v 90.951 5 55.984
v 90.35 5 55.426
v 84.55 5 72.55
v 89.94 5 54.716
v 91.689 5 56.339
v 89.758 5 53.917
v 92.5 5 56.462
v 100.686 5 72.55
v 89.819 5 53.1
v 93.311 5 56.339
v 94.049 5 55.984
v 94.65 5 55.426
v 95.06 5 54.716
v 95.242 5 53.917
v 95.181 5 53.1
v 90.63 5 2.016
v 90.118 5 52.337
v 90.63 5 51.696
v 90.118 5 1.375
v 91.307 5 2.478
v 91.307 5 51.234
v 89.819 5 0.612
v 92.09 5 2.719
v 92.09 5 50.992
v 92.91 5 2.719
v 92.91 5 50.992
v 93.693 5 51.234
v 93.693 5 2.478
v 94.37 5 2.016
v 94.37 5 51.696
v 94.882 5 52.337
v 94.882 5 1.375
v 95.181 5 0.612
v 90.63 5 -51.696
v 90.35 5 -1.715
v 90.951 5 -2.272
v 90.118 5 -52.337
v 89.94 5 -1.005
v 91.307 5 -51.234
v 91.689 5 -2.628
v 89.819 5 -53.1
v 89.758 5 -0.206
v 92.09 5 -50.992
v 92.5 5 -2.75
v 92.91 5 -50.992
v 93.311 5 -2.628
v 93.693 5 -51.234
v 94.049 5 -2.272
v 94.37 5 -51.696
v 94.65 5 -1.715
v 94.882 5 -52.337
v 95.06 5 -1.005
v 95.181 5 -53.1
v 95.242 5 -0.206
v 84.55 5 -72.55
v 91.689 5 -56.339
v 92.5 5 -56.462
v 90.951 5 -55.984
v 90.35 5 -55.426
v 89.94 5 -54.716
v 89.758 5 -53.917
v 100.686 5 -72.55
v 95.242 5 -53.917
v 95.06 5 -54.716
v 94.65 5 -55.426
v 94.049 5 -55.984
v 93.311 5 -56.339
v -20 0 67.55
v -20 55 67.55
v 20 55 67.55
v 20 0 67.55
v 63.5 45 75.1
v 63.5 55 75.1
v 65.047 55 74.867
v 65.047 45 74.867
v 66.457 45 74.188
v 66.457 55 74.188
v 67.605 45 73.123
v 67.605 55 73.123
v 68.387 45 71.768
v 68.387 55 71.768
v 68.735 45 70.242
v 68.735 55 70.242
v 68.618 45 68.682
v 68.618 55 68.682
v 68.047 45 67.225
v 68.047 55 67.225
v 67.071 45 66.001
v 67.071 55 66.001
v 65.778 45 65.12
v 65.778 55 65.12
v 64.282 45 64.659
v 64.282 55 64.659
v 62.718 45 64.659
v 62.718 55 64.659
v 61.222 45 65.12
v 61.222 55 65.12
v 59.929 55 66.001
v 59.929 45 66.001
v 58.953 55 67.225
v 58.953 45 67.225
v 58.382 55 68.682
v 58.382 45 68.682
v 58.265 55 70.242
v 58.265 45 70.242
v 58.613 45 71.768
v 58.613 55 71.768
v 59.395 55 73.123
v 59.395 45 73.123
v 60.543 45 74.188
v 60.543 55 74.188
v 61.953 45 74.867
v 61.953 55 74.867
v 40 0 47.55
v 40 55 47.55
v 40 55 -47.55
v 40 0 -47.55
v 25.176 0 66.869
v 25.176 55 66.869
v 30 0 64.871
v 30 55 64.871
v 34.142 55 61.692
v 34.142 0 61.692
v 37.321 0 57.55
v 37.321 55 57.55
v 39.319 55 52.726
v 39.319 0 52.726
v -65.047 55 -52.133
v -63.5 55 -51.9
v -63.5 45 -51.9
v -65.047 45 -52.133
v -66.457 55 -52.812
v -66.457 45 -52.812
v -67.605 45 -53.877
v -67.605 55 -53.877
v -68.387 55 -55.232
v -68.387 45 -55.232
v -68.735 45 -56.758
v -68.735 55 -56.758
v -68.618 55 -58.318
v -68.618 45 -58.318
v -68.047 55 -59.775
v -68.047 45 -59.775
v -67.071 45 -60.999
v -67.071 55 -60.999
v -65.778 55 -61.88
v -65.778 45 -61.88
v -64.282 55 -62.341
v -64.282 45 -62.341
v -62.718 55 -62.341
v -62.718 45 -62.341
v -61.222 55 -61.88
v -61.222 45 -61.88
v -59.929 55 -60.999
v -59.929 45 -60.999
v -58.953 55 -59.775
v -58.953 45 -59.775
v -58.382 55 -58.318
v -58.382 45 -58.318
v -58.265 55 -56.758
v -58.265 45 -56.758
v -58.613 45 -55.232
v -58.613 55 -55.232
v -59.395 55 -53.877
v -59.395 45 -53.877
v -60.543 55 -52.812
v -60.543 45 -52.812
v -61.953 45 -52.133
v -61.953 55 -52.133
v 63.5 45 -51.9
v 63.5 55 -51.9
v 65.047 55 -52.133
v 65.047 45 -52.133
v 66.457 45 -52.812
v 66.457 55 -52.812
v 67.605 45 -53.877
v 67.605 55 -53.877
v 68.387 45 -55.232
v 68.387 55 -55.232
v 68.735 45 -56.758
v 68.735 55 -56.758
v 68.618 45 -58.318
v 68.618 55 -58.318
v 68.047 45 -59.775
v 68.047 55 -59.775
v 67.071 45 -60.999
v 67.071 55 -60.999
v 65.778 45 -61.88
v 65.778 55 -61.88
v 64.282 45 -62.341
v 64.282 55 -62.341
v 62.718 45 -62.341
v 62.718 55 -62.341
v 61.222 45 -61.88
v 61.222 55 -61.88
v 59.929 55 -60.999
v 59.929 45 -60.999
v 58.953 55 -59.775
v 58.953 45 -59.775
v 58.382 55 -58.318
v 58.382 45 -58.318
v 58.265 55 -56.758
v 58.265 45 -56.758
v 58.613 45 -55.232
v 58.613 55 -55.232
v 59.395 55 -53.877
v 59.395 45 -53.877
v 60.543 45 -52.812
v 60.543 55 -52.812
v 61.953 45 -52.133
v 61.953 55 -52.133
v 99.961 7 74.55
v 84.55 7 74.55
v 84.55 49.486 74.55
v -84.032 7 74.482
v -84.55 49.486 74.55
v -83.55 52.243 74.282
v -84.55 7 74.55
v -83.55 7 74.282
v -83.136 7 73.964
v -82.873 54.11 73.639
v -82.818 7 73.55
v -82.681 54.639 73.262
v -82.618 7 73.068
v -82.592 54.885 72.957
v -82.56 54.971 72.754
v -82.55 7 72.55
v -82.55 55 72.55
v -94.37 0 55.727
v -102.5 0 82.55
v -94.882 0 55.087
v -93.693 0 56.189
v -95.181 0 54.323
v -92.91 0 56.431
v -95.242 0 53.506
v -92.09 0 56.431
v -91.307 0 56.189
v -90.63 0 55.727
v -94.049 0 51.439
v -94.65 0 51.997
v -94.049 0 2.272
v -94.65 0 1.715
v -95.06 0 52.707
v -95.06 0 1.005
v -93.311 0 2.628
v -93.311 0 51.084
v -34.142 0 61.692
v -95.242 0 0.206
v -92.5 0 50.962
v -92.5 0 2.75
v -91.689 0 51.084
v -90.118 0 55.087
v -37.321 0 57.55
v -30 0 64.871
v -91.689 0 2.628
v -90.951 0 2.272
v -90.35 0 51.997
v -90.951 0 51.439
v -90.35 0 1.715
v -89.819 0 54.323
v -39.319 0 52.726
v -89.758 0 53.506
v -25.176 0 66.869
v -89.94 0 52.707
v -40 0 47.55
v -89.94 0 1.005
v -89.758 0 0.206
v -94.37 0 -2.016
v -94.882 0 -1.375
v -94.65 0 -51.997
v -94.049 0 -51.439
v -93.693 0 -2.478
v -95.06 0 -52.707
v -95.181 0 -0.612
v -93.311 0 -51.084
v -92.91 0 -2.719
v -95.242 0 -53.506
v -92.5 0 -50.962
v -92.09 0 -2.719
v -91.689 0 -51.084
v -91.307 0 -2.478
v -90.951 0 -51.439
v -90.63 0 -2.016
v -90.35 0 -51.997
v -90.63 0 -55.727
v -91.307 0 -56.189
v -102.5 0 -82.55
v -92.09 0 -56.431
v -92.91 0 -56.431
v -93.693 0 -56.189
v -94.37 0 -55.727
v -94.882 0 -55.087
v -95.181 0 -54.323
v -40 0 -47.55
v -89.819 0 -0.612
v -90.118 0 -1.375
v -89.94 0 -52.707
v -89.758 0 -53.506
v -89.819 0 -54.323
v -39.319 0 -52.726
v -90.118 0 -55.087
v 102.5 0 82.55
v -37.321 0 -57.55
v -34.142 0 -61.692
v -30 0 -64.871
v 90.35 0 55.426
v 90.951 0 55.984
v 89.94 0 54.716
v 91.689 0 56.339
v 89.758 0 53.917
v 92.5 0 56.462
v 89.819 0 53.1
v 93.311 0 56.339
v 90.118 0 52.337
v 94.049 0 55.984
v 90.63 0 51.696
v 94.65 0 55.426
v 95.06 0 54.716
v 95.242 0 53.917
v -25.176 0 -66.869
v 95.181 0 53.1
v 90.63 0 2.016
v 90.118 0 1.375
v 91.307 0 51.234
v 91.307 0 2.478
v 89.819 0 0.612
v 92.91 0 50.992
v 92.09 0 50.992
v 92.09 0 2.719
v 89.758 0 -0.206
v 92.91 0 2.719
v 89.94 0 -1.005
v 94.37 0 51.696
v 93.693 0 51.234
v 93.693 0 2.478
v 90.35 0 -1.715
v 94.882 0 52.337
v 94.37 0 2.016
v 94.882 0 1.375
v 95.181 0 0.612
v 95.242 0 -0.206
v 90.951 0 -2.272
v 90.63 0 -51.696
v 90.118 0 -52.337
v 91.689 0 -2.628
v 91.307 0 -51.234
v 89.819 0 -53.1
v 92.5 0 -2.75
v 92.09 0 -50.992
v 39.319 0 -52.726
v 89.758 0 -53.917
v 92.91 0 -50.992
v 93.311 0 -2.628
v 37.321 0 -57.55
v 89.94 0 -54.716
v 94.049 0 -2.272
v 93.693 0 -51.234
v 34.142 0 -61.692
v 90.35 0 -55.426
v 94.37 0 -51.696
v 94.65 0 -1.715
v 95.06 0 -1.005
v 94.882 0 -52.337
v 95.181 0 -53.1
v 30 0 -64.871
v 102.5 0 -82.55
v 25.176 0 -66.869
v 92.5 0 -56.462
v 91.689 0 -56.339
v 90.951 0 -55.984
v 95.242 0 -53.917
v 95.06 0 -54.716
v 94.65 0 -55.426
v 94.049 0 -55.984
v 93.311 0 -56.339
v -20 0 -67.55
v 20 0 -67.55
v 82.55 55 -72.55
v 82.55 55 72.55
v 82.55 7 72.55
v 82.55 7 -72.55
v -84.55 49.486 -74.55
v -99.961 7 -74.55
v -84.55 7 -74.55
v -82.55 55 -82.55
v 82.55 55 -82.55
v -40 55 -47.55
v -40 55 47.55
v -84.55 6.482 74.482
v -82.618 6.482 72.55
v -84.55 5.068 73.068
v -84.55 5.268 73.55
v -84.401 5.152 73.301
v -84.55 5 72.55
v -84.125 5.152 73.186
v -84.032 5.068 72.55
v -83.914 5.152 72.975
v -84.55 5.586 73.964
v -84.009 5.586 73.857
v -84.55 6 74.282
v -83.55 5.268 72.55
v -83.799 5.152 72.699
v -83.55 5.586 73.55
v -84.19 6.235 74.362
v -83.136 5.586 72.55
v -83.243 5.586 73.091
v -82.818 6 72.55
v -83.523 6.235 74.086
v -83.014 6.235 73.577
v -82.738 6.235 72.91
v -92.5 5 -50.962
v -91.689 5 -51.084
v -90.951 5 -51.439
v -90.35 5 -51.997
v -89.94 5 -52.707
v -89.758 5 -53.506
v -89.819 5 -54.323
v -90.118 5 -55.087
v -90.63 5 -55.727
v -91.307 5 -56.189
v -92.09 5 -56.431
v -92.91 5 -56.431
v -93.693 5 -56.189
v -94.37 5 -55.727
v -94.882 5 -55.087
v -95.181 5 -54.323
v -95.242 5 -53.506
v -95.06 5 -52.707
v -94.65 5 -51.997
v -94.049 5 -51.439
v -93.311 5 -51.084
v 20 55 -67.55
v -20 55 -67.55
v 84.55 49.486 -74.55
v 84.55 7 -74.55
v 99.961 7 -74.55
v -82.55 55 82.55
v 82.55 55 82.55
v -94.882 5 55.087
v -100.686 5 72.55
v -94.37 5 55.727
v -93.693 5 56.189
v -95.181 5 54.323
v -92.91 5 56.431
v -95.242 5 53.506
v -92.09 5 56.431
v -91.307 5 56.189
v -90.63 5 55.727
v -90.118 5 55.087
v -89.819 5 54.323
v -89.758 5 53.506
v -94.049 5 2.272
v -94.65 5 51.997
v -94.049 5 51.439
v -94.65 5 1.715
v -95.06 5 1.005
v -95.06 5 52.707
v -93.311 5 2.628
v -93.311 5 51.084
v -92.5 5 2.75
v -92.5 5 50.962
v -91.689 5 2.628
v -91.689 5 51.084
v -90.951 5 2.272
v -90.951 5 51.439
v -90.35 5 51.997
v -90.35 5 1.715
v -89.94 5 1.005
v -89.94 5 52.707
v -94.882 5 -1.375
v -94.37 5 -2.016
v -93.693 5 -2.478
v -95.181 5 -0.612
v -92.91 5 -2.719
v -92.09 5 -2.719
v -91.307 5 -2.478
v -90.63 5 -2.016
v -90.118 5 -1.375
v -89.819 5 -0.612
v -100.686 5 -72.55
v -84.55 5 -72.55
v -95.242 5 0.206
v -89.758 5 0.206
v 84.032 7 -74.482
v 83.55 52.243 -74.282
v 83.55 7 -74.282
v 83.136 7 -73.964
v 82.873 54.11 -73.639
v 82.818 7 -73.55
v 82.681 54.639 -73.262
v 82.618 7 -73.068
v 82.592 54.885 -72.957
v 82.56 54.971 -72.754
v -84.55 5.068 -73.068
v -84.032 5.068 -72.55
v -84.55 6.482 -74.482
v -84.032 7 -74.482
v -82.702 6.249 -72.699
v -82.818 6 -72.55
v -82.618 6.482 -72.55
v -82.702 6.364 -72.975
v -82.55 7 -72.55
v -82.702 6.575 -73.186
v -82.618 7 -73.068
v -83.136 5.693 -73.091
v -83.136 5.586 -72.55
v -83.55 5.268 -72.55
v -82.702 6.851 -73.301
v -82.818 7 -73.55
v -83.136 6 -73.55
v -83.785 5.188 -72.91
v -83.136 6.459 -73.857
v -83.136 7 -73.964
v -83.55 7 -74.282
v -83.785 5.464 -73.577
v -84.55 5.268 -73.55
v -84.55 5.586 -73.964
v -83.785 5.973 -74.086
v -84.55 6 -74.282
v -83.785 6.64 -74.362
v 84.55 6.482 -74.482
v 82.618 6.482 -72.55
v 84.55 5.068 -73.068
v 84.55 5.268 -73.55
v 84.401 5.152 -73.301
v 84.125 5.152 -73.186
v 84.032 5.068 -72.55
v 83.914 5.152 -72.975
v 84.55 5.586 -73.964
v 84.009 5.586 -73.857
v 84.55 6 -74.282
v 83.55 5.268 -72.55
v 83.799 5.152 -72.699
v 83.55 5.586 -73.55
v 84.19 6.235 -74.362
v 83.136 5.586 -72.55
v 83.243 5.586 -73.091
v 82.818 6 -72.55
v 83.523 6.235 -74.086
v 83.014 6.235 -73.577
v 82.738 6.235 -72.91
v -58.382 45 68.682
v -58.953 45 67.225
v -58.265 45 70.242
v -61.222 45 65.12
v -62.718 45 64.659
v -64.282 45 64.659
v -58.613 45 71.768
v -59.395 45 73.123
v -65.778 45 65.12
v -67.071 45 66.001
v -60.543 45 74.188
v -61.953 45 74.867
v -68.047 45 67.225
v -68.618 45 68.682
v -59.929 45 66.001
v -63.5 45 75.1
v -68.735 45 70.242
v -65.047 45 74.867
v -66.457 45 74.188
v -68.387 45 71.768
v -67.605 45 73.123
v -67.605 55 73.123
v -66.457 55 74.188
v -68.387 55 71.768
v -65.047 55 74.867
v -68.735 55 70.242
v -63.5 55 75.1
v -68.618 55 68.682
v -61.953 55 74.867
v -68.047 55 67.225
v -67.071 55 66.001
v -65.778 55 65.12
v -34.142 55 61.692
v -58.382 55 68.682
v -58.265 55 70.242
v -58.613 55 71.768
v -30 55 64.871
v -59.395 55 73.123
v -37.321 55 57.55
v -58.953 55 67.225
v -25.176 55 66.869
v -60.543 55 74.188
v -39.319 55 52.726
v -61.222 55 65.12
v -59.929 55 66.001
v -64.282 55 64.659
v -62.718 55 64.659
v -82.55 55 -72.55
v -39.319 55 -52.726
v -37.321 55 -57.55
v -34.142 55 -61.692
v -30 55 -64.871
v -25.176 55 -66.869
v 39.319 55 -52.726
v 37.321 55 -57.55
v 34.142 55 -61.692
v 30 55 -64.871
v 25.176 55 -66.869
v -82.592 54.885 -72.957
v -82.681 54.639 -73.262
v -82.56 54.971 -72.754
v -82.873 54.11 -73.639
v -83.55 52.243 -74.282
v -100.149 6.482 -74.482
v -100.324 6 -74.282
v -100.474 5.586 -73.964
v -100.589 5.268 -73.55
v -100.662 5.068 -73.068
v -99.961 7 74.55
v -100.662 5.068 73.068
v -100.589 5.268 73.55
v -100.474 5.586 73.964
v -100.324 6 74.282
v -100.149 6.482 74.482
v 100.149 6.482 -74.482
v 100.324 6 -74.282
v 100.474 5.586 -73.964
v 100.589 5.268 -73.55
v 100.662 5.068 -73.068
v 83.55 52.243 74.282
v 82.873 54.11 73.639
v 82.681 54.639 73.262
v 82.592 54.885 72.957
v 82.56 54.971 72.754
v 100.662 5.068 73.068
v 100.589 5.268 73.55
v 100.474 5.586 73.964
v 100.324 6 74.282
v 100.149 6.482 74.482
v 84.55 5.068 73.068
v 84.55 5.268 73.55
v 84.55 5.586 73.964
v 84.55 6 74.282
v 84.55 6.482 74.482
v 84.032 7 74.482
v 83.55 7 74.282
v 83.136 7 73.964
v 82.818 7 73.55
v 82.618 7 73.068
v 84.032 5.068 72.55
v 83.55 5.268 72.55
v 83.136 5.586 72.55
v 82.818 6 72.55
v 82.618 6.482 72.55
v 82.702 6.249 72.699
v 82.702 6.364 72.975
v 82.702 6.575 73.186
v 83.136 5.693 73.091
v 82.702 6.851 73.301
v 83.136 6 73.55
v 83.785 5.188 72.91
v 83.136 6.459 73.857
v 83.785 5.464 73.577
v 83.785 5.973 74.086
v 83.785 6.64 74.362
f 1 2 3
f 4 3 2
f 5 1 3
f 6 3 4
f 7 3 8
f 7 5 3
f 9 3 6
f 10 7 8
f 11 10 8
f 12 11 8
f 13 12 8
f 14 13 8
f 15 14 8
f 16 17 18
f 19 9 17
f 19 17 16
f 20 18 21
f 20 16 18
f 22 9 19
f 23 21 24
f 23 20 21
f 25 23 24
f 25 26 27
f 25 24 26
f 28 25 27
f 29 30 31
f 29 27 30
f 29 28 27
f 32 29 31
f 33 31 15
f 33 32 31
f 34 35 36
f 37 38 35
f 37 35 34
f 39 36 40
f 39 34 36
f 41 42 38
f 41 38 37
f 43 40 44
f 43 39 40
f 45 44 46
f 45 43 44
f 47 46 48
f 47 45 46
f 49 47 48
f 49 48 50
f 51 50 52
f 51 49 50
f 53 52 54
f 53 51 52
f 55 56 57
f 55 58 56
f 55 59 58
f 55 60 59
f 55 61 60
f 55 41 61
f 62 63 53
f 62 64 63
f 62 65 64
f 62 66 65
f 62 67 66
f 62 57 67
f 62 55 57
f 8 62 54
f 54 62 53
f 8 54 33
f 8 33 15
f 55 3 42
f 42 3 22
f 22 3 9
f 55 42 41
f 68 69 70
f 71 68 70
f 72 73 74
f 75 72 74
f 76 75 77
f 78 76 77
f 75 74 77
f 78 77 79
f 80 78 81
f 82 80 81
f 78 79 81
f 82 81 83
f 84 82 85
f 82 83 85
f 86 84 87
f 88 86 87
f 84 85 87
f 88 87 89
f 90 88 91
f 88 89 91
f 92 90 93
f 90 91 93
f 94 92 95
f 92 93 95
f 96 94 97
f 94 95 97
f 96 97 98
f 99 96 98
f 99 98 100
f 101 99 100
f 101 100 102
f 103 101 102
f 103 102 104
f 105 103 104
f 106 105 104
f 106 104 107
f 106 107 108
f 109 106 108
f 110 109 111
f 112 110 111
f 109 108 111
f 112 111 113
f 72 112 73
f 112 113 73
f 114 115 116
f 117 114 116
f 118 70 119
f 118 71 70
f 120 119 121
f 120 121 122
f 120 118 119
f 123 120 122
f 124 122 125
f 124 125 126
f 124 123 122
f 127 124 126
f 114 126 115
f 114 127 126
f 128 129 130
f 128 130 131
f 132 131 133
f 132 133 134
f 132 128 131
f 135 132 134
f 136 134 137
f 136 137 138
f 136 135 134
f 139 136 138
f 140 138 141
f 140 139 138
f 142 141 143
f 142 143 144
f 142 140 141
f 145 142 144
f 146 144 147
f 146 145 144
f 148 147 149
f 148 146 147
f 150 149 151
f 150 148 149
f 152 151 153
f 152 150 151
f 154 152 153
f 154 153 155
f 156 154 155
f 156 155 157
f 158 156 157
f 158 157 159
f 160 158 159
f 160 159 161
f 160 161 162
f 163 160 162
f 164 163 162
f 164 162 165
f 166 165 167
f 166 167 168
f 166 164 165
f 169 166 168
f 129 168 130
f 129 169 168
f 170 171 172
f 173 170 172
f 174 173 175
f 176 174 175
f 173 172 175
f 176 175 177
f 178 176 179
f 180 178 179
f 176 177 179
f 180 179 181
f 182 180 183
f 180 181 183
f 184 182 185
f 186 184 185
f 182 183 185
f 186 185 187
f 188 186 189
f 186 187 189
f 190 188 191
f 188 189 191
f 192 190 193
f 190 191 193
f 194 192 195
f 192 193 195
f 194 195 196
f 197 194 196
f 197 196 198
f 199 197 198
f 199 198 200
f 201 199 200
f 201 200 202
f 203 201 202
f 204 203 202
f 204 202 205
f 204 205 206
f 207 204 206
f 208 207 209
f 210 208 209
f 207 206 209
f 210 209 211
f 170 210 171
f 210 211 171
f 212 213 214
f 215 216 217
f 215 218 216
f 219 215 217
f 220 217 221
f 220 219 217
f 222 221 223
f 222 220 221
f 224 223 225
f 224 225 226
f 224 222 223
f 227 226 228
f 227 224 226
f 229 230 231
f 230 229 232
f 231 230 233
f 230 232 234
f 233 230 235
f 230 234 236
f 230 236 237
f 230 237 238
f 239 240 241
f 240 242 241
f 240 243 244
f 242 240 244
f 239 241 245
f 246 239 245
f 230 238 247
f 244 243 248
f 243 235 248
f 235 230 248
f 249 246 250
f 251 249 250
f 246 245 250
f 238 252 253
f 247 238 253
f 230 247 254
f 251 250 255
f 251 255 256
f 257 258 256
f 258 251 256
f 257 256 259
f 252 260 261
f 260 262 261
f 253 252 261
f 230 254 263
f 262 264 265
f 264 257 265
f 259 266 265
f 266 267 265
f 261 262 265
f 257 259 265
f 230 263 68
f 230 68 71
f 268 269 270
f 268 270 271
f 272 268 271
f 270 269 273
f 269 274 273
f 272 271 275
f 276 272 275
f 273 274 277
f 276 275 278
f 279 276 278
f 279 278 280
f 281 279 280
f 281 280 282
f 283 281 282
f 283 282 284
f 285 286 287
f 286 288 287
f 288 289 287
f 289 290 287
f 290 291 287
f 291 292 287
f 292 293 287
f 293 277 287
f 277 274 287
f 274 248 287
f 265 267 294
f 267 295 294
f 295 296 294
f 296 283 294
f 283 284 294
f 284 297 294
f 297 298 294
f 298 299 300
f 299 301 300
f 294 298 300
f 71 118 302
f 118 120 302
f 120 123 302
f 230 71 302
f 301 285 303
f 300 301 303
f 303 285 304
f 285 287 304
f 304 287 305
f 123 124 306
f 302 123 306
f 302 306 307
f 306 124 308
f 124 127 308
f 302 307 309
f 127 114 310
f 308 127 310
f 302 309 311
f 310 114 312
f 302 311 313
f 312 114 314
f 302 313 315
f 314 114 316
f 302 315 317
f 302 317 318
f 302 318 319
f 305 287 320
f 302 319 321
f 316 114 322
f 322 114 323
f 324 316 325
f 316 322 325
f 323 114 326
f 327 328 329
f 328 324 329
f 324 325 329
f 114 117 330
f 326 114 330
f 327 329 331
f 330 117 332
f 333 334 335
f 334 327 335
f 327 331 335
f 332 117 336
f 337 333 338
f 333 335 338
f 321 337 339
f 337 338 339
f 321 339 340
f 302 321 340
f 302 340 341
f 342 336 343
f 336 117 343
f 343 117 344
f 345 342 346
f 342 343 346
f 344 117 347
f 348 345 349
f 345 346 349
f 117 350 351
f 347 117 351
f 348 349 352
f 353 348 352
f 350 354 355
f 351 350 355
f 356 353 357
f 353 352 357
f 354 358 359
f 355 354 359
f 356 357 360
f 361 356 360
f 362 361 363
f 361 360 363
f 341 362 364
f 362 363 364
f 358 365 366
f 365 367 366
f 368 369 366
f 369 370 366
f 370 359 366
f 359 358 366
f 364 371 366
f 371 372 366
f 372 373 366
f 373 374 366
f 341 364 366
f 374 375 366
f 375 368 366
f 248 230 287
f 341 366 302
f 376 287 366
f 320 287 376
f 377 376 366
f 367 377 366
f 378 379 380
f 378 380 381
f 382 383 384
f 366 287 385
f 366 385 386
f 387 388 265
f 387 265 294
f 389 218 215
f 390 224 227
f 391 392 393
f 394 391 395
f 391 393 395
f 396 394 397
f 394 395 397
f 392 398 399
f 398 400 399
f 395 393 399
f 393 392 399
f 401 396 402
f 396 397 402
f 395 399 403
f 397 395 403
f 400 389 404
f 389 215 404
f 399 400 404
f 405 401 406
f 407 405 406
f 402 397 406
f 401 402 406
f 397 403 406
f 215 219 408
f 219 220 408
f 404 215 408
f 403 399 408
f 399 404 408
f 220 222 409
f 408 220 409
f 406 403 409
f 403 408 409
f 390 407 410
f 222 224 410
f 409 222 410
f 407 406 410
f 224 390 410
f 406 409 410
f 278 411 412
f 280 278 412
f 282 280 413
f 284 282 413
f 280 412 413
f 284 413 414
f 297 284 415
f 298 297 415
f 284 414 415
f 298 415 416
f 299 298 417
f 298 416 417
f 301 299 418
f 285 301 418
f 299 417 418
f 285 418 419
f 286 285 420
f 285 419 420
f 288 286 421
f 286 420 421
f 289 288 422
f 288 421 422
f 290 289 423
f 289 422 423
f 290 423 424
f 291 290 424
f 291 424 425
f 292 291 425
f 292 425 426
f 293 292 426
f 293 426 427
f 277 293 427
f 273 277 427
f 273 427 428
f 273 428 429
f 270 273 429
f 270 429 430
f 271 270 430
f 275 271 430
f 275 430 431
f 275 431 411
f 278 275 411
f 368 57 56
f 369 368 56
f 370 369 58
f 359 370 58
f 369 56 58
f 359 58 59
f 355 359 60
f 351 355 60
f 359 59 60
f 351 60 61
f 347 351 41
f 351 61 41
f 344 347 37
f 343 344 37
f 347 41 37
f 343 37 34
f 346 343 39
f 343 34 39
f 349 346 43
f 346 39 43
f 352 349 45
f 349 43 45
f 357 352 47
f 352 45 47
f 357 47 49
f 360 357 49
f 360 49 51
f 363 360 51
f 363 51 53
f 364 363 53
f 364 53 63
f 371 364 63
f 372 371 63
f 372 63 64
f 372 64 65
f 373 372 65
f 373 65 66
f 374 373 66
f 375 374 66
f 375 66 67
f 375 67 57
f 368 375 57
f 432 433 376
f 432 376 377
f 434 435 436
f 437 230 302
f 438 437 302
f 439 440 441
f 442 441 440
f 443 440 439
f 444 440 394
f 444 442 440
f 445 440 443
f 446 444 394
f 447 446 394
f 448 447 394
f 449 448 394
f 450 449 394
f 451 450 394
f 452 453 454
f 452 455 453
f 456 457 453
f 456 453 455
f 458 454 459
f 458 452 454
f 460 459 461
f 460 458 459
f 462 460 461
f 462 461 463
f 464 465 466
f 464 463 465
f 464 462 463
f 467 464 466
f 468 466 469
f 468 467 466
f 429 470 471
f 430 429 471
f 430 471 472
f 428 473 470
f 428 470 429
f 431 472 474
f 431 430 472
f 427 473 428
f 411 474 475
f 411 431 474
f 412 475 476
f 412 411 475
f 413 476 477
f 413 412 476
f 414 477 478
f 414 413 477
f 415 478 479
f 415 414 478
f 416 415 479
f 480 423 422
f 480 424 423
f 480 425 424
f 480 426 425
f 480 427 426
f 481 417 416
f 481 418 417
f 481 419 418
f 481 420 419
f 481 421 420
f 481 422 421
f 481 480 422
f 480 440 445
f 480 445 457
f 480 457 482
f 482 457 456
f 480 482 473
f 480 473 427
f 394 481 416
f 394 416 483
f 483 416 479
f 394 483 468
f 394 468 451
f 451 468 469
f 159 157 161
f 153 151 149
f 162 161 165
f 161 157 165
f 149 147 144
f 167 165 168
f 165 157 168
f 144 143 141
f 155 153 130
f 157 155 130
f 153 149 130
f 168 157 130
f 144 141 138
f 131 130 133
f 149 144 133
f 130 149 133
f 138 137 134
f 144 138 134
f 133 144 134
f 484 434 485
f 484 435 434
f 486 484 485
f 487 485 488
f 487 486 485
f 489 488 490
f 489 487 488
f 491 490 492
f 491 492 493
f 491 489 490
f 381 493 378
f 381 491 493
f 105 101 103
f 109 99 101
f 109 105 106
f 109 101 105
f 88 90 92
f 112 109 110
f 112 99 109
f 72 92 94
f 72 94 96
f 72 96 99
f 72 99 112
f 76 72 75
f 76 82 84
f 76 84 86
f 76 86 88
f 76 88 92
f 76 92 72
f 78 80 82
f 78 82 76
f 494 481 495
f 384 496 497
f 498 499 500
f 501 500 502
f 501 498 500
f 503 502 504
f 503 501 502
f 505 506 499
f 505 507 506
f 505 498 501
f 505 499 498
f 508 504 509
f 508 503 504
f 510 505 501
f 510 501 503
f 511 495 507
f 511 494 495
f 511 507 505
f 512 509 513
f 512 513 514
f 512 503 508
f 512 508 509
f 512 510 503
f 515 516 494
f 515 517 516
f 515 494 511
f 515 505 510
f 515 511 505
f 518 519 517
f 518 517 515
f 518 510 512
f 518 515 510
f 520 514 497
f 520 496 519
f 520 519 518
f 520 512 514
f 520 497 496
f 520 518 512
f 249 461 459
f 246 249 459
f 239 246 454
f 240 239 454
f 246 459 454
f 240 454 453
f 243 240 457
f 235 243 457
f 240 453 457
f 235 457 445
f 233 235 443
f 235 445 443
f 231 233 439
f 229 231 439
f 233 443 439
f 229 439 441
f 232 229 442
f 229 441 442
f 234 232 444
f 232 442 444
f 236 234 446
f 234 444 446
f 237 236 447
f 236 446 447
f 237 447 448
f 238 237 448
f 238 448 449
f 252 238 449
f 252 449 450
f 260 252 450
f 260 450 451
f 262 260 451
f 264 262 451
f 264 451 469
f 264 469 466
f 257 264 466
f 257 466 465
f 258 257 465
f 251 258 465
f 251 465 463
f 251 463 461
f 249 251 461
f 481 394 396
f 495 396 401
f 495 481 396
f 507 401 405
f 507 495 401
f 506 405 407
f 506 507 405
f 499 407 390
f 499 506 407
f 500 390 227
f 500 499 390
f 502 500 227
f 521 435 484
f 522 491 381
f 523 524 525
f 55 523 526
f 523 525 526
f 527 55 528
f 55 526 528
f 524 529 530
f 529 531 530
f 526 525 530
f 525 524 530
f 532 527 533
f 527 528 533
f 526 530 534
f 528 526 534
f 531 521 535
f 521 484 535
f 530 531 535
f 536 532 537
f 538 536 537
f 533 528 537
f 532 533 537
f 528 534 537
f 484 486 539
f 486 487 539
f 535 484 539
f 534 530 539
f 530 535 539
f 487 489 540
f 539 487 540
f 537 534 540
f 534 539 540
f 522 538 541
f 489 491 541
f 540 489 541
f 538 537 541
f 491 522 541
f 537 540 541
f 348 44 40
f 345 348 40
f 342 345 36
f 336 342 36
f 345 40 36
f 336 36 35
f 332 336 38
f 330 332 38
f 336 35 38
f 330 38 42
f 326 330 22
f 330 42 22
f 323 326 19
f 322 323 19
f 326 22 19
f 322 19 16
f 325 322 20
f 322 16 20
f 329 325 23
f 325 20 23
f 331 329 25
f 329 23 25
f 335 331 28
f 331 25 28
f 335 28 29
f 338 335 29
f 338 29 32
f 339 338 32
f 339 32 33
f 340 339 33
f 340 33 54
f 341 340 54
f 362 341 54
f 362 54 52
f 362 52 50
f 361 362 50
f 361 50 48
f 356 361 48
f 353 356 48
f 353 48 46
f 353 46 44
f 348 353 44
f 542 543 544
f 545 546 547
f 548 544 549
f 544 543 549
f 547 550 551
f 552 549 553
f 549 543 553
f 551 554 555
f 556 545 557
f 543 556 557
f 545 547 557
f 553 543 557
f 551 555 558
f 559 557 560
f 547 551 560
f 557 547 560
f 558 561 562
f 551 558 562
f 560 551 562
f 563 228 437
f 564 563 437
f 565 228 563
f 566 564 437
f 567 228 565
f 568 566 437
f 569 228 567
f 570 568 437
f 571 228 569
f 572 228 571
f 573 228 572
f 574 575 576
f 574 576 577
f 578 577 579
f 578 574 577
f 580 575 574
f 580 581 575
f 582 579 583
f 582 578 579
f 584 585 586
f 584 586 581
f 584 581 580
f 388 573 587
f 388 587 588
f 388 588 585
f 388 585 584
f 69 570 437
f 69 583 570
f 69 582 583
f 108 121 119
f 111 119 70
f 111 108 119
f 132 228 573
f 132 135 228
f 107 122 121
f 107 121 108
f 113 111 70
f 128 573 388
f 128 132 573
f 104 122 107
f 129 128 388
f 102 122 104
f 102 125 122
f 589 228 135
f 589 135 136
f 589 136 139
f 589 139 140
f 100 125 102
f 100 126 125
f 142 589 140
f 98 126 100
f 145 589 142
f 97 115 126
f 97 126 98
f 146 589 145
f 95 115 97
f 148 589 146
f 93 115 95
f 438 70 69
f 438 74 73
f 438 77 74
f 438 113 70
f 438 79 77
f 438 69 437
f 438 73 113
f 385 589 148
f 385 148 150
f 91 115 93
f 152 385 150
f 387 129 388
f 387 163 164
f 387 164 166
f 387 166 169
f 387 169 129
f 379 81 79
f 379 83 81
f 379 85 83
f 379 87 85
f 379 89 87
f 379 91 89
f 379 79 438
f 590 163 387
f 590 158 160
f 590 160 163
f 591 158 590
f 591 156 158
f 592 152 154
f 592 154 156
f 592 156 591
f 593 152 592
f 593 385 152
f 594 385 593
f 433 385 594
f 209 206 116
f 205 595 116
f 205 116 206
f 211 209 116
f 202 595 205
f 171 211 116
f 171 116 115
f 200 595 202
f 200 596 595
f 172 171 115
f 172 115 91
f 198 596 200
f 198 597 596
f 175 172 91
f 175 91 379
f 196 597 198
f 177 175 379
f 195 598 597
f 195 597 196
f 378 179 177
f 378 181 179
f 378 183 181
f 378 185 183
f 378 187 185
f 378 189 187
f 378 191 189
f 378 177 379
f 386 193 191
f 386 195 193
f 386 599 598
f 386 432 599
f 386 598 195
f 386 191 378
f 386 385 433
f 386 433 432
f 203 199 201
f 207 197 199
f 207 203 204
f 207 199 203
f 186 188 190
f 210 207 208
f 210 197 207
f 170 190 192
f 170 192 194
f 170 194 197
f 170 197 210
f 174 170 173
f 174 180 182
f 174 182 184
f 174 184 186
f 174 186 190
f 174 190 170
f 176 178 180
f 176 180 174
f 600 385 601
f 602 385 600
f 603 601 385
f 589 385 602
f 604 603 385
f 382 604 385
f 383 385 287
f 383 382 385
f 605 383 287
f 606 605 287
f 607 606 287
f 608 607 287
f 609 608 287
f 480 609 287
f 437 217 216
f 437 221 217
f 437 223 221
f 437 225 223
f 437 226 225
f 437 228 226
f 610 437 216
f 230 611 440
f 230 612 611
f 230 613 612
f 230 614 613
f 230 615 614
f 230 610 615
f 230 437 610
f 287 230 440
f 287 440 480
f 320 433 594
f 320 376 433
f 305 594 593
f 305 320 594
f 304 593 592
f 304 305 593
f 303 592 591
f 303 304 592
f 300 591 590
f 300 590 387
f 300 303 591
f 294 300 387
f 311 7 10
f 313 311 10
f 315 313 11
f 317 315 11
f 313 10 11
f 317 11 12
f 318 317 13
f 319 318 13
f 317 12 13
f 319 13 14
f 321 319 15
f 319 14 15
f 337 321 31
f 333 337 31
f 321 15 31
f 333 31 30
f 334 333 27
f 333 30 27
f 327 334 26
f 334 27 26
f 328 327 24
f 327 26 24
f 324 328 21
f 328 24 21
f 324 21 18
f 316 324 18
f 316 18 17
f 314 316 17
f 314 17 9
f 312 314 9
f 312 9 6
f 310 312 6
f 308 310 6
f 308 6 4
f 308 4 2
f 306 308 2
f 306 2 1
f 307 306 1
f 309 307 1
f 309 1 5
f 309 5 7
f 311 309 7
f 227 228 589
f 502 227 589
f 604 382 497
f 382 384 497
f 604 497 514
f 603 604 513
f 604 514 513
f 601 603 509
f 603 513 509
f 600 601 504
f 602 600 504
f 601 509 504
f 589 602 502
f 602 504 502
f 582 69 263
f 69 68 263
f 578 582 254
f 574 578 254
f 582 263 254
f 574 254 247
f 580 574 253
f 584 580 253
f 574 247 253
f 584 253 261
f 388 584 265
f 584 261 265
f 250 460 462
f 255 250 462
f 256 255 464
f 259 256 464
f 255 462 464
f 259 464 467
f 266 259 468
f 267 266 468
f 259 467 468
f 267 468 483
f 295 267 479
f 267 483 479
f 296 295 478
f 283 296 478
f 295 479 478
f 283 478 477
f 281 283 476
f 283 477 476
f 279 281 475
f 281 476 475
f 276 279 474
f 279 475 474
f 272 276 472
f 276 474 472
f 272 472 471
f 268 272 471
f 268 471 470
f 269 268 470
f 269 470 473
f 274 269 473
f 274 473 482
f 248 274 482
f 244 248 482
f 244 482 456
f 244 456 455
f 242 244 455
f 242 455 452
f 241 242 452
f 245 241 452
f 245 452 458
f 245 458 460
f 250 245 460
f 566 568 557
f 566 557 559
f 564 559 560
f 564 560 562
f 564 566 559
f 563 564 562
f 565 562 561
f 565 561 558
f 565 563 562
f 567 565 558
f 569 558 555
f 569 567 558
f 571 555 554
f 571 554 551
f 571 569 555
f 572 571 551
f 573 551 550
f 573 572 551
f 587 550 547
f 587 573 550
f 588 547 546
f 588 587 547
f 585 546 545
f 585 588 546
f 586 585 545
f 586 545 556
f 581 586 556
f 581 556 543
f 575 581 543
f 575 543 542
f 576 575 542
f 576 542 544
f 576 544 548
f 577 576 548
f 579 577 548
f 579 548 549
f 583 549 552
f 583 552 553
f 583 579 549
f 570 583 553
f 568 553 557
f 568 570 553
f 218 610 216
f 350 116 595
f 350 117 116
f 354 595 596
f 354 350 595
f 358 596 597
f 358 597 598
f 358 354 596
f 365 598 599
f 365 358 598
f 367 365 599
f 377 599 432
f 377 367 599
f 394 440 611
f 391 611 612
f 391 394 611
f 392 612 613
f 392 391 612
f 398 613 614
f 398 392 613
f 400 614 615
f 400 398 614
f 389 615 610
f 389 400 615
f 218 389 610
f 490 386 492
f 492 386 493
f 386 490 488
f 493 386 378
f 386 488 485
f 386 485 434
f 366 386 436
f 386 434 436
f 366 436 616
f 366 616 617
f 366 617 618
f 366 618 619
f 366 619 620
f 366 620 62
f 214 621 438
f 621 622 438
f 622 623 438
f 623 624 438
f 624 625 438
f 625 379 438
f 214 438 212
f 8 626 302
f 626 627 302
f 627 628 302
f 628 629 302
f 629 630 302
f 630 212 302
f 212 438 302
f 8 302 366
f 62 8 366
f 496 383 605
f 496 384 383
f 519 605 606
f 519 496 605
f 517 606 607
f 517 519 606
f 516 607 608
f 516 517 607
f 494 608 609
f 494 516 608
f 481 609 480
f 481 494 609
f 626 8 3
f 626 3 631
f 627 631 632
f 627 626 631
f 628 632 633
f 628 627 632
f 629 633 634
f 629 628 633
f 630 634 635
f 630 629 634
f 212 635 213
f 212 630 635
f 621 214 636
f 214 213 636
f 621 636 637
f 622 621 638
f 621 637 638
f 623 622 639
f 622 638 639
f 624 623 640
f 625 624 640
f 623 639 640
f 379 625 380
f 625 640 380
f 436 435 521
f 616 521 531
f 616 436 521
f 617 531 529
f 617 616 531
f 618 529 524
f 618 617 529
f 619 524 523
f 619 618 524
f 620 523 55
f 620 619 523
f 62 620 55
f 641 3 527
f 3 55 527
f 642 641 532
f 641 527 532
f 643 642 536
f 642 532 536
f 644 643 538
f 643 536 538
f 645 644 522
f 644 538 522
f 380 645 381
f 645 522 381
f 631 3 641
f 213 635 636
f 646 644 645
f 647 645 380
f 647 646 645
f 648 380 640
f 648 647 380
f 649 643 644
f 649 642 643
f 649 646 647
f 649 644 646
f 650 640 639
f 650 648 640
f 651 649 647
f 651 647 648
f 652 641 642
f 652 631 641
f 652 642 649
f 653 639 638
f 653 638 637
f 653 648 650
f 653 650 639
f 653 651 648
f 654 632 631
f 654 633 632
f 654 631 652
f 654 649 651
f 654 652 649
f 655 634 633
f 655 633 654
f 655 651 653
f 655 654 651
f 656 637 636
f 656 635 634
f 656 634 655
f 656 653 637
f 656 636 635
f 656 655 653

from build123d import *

# Parameters (mm, degrees)
SKETCH1_W           = 205
SKETCH1_H           = 165.1
BOSS_EXTRUDE1_DEPTH = 55
CUT_EXTRUDE1_REACH  = 203.964
SKETCH3_W           = 19.95
SKETCH3_H           = 149.1
CUT_EXTRUDE2_DEPTH  = 50
CUT_EXTRUDE3_REACH  = 142.786
SKETCH4_R           = 2.75
FILLET1_R           = 2
SKETCH5_R           = 5.25
CUT_EXTRUDE4_DEPTH  = 10
CUT_EXTRUDE5_REACH  = 144.639
SKETCH6_W           = 80
SKETCH6_H           = 135.1
FILLET2_R           = 20


with BuildPart() as part:
    # Sketch1 → Boss-Extrude1 (new body)
    with BuildSketch(Plane(origin=(0, 0, 0), x_dir=(1, 0, 0), z_dir=(0, 1, 0))):
        Rectangle(SKETCH1_W, SKETCH1_H)
    extrude(amount=BOSS_EXTRUDE1_DEPTH)

    # Sketch2 → Cut-Extrude1 (cut, up to next)
    with BuildSketch(Plane.XY.offset(82.55), mode=Mode.PRIVATE) as cut_extrude1_sk1:
        Polygon((82.55, 55), (102.5, 0), (102.5, 55), align=None)
    cut_extrude1_tool1 = extrude(cut_extrude1_sk1.sketch, amount=-CUT_EXTRUDE1_REACH, mode=Mode.PRIVATE) & part.part
    # Sketch2 → Cut-Extrude1 (cut, up to next)
    with BuildSketch(Plane.XY.offset(82.55), mode=Mode.PRIVATE) as cut_extrude1_sk2:
        Polygon((-82.55, 55), (-102.5, 0), (-102.5, 55), align=None)
    cut_extrude1_tool2 = extrude(cut_extrude1_sk2.sketch, amount=-CUT_EXTRUDE1_REACH, mode=Mode.PRIVATE) & part.part
    add(cut_extrude1_tool1.solids().sort_by_distance((95.85, 36.666667, 82.55))[0], mode=Mode.SUBTRACT)
    add(cut_extrude1_tool2.solids().sort_by_distance((-95.85, 36.666667, 82.55))[0], mode=Mode.SUBTRACT)

    # Sketch3 → Cut-Extrude2 (cut)
    with BuildSketch(Plane(origin=(0, 55, 0), x_dir=(1, 0, 0), z_dir=(0, 1, 0))):
        with Locations((-92.525, 0)):
            Rectangle(SKETCH3_W, SKETCH3_H)
        with Locations((92.525, 0)):
            Rectangle(SKETCH3_W, SKETCH3_H)
    extrude(amount=-CUT_EXTRUDE2_DEPTH, mode=Mode.SUBTRACT)

    # Sketch4 → Cut-Extrude3 (cut, up to next)
    with BuildSketch(Plane(origin=(0, 5, 0), x_dir=(1, 0, 0), z_dir=(0, 1, 0)), mode=Mode.PRIVATE) as cut_extrude3_sk1:
        with Locations(Location((-92.5, 53.71150957, 0), (0, 0, 270))):
            Circle(SKETCH4_R)
    cut_extrude3_tool1 = extrude(cut_extrude3_sk1.sketch, amount=-CUT_EXTRUDE3_REACH, mode=Mode.PRIVATE) & part.part
    # Sketch4 → Cut-Extrude3 (cut, up to next)
    with BuildSketch(Plane(origin=(0, 5, 0), x_dir=(1, 0, 0), z_dir=(0, 1, 0)), mode=Mode.PRIVATE) as cut_extrude3_sk2:
        with Locations(Location((-92.5, 0, 0), (0, 0, 270))):
            Circle(SKETCH4_R)
    cut_extrude3_tool2 = extrude(cut_extrude3_sk2.sketch, amount=-CUT_EXTRUDE3_REACH, mode=Mode.PRIVATE) & part.part
    # Sketch4 → Cut-Extrude3 (cut, up to next)
    with BuildSketch(Plane(origin=(0, 5, 0), x_dir=(1, 0, 0), z_dir=(0, 1, 0)), mode=Mode.PRIVATE) as cut_extrude3_sk3:
        with Locations(Location((-92.5, -53.71150957, 0), (0, 0, 90))):
            Circle(SKETCH4_R)
    cut_extrude3_tool3 = extrude(cut_extrude3_sk3.sketch, amount=-CUT_EXTRUDE3_REACH, mode=Mode.PRIVATE) & part.part
    # Sketch4 → Cut-Extrude3 (cut, up to next)
    with BuildSketch(Plane(origin=(0, 5, 0), x_dir=(1, 0, 0), z_dir=(0, 1, 0)), mode=Mode.PRIVATE) as cut_extrude3_sk4:
        with Locations(Location((92.5, -53.71150957, 0), (0, 0, 270))):
            Circle(SKETCH4_R)
    cut_extrude3_tool4 = extrude(cut_extrude3_sk4.sketch, amount=-CUT_EXTRUDE3_REACH, mode=Mode.PRIVATE) & part.part
    # Sketch4 → Cut-Extrude3 (cut, up to next)
    with BuildSketch(Plane(origin=(0, 5, 0), x_dir=(1, 0, 0), z_dir=(0, 1, 0)), mode=Mode.PRIVATE) as cut_extrude3_sk5:
        with Locations(Location((92.5, 0, 0), (0, 0, 90))):
            Circle(SKETCH4_R)
    cut_extrude3_tool5 = extrude(cut_extrude3_sk5.sketch, amount=-CUT_EXTRUDE3_REACH, mode=Mode.PRIVATE) & part.part
    # Sketch4 → Cut-Extrude3 (cut, up to next)
    with BuildSketch(Plane(origin=(0, 5, 0), x_dir=(1, 0, 0), z_dir=(0, 1, 0)), mode=Mode.PRIVATE) as cut_extrude3_sk6:
        with Locations(Location((92.5, 53.71150957, 0), (0, 0, 90))):
            Circle(SKETCH4_R)
    cut_extrude3_tool6 = extrude(cut_extrude3_sk6.sketch, amount=-CUT_EXTRUDE3_REACH, mode=Mode.PRIVATE) & part.part
    add(cut_extrude3_tool1.solids().sort_by_distance((-92.5, 5, -53.71151))[0], mode=Mode.SUBTRACT)
    add(cut_extrude3_tool2.solids().sort_by_distance((-92.5, 5, 0))[0], mode=Mode.SUBTRACT)
    add(cut_extrude3_tool3.solids().sort_by_distance((-92.5, 5, 53.71151))[0], mode=Mode.SUBTRACT)
    add(cut_extrude3_tool4.solids().sort_by_distance((92.5, 5, 53.71151))[0], mode=Mode.SUBTRACT)
    add(cut_extrude3_tool5.solids().sort_by_distance((92.5, 5, 0))[0], mode=Mode.SUBTRACT)
    add(cut_extrude3_tool6.solids().sort_by_distance((92.5, 5, -53.71151))[0], mode=Mode.SUBTRACT)

    # Fillet1
    fillet1_edges = [part.edges().sort_by_distance(p)[0] for p in [
        (-91.618181818, 5, -74.55),
        (-82.55, 30, 74.55),
        (-91.618181818, 5, 74.55),
        (-82.55, 5, 0),
        (-82.55, 30, -74.55),
        (91.618181818, 5, 74.55),
        (82.55, 30, -74.55),
        (91.618181818, 5, -74.55),
        (82.55, 5, 0),
        (82.55, 30, 74.55),
    ]]
    fillet(fillet1_edges, radius=FILLET1_R)

    # Sketch5 → Cut-Extrude4 (cut)
    with BuildSketch(Plane(origin=(0, 55, 0), x_dir=(1, 0, 0), z_dir=(0, 1, 0))):
        with Locations(Location((63.5, -69.85, 0), (0, 0, 270))):
            Circle(SKETCH5_R)
        with Locations(Location((63.5, 57.15, 0), (0, 0, 270))):
            Circle(SKETCH5_R)
    cut_extrude4 = extrude(amount=-CUT_EXTRUDE4_DEPTH, mode=Mode.SUBTRACT)

    # Mirror1: Cut-Extrude4 across plane
    add(cut_extrude4.mirror(Plane(origin=(0, 0, 0), x_dir=(0, 0, 1), z_dir=(1, 0, 0))), mode=Mode.SUBTRACT)

    # Sketch6 → Cut-Extrude5 (cut, up to next)
    with BuildSketch(Plane(origin=(0, 55, 0), x_dir=(1, 0, 0), z_dir=(0, 1, 0)), mode=Mode.PRIVATE) as cut_extrude5_sk1:
        Rectangle(SKETCH6_W, SKETCH6_H)
    cut_extrude5_tool1 = extrude(cut_extrude5_sk1.sketch, amount=-CUT_EXTRUDE5_REACH, mode=Mode.PRIVATE) & part.part
    add(cut_extrude5_tool1.solids().sort_by_distance((0, 55, 0))[0], mode=Mode.SUBTRACT)

    # Fillet2
    fillet2_edges = [part.edges().sort_by_distance(p)[0] for p in [
        (40, 27.5, -67.55),
        (40, 27.5, 67.55),
        (-40, 27.5, 67.55),
        (-40, 27.5, -67.55),
    ]]
    fillet(fillet2_edges, radius=FILLET2_R)


solid = part.part
